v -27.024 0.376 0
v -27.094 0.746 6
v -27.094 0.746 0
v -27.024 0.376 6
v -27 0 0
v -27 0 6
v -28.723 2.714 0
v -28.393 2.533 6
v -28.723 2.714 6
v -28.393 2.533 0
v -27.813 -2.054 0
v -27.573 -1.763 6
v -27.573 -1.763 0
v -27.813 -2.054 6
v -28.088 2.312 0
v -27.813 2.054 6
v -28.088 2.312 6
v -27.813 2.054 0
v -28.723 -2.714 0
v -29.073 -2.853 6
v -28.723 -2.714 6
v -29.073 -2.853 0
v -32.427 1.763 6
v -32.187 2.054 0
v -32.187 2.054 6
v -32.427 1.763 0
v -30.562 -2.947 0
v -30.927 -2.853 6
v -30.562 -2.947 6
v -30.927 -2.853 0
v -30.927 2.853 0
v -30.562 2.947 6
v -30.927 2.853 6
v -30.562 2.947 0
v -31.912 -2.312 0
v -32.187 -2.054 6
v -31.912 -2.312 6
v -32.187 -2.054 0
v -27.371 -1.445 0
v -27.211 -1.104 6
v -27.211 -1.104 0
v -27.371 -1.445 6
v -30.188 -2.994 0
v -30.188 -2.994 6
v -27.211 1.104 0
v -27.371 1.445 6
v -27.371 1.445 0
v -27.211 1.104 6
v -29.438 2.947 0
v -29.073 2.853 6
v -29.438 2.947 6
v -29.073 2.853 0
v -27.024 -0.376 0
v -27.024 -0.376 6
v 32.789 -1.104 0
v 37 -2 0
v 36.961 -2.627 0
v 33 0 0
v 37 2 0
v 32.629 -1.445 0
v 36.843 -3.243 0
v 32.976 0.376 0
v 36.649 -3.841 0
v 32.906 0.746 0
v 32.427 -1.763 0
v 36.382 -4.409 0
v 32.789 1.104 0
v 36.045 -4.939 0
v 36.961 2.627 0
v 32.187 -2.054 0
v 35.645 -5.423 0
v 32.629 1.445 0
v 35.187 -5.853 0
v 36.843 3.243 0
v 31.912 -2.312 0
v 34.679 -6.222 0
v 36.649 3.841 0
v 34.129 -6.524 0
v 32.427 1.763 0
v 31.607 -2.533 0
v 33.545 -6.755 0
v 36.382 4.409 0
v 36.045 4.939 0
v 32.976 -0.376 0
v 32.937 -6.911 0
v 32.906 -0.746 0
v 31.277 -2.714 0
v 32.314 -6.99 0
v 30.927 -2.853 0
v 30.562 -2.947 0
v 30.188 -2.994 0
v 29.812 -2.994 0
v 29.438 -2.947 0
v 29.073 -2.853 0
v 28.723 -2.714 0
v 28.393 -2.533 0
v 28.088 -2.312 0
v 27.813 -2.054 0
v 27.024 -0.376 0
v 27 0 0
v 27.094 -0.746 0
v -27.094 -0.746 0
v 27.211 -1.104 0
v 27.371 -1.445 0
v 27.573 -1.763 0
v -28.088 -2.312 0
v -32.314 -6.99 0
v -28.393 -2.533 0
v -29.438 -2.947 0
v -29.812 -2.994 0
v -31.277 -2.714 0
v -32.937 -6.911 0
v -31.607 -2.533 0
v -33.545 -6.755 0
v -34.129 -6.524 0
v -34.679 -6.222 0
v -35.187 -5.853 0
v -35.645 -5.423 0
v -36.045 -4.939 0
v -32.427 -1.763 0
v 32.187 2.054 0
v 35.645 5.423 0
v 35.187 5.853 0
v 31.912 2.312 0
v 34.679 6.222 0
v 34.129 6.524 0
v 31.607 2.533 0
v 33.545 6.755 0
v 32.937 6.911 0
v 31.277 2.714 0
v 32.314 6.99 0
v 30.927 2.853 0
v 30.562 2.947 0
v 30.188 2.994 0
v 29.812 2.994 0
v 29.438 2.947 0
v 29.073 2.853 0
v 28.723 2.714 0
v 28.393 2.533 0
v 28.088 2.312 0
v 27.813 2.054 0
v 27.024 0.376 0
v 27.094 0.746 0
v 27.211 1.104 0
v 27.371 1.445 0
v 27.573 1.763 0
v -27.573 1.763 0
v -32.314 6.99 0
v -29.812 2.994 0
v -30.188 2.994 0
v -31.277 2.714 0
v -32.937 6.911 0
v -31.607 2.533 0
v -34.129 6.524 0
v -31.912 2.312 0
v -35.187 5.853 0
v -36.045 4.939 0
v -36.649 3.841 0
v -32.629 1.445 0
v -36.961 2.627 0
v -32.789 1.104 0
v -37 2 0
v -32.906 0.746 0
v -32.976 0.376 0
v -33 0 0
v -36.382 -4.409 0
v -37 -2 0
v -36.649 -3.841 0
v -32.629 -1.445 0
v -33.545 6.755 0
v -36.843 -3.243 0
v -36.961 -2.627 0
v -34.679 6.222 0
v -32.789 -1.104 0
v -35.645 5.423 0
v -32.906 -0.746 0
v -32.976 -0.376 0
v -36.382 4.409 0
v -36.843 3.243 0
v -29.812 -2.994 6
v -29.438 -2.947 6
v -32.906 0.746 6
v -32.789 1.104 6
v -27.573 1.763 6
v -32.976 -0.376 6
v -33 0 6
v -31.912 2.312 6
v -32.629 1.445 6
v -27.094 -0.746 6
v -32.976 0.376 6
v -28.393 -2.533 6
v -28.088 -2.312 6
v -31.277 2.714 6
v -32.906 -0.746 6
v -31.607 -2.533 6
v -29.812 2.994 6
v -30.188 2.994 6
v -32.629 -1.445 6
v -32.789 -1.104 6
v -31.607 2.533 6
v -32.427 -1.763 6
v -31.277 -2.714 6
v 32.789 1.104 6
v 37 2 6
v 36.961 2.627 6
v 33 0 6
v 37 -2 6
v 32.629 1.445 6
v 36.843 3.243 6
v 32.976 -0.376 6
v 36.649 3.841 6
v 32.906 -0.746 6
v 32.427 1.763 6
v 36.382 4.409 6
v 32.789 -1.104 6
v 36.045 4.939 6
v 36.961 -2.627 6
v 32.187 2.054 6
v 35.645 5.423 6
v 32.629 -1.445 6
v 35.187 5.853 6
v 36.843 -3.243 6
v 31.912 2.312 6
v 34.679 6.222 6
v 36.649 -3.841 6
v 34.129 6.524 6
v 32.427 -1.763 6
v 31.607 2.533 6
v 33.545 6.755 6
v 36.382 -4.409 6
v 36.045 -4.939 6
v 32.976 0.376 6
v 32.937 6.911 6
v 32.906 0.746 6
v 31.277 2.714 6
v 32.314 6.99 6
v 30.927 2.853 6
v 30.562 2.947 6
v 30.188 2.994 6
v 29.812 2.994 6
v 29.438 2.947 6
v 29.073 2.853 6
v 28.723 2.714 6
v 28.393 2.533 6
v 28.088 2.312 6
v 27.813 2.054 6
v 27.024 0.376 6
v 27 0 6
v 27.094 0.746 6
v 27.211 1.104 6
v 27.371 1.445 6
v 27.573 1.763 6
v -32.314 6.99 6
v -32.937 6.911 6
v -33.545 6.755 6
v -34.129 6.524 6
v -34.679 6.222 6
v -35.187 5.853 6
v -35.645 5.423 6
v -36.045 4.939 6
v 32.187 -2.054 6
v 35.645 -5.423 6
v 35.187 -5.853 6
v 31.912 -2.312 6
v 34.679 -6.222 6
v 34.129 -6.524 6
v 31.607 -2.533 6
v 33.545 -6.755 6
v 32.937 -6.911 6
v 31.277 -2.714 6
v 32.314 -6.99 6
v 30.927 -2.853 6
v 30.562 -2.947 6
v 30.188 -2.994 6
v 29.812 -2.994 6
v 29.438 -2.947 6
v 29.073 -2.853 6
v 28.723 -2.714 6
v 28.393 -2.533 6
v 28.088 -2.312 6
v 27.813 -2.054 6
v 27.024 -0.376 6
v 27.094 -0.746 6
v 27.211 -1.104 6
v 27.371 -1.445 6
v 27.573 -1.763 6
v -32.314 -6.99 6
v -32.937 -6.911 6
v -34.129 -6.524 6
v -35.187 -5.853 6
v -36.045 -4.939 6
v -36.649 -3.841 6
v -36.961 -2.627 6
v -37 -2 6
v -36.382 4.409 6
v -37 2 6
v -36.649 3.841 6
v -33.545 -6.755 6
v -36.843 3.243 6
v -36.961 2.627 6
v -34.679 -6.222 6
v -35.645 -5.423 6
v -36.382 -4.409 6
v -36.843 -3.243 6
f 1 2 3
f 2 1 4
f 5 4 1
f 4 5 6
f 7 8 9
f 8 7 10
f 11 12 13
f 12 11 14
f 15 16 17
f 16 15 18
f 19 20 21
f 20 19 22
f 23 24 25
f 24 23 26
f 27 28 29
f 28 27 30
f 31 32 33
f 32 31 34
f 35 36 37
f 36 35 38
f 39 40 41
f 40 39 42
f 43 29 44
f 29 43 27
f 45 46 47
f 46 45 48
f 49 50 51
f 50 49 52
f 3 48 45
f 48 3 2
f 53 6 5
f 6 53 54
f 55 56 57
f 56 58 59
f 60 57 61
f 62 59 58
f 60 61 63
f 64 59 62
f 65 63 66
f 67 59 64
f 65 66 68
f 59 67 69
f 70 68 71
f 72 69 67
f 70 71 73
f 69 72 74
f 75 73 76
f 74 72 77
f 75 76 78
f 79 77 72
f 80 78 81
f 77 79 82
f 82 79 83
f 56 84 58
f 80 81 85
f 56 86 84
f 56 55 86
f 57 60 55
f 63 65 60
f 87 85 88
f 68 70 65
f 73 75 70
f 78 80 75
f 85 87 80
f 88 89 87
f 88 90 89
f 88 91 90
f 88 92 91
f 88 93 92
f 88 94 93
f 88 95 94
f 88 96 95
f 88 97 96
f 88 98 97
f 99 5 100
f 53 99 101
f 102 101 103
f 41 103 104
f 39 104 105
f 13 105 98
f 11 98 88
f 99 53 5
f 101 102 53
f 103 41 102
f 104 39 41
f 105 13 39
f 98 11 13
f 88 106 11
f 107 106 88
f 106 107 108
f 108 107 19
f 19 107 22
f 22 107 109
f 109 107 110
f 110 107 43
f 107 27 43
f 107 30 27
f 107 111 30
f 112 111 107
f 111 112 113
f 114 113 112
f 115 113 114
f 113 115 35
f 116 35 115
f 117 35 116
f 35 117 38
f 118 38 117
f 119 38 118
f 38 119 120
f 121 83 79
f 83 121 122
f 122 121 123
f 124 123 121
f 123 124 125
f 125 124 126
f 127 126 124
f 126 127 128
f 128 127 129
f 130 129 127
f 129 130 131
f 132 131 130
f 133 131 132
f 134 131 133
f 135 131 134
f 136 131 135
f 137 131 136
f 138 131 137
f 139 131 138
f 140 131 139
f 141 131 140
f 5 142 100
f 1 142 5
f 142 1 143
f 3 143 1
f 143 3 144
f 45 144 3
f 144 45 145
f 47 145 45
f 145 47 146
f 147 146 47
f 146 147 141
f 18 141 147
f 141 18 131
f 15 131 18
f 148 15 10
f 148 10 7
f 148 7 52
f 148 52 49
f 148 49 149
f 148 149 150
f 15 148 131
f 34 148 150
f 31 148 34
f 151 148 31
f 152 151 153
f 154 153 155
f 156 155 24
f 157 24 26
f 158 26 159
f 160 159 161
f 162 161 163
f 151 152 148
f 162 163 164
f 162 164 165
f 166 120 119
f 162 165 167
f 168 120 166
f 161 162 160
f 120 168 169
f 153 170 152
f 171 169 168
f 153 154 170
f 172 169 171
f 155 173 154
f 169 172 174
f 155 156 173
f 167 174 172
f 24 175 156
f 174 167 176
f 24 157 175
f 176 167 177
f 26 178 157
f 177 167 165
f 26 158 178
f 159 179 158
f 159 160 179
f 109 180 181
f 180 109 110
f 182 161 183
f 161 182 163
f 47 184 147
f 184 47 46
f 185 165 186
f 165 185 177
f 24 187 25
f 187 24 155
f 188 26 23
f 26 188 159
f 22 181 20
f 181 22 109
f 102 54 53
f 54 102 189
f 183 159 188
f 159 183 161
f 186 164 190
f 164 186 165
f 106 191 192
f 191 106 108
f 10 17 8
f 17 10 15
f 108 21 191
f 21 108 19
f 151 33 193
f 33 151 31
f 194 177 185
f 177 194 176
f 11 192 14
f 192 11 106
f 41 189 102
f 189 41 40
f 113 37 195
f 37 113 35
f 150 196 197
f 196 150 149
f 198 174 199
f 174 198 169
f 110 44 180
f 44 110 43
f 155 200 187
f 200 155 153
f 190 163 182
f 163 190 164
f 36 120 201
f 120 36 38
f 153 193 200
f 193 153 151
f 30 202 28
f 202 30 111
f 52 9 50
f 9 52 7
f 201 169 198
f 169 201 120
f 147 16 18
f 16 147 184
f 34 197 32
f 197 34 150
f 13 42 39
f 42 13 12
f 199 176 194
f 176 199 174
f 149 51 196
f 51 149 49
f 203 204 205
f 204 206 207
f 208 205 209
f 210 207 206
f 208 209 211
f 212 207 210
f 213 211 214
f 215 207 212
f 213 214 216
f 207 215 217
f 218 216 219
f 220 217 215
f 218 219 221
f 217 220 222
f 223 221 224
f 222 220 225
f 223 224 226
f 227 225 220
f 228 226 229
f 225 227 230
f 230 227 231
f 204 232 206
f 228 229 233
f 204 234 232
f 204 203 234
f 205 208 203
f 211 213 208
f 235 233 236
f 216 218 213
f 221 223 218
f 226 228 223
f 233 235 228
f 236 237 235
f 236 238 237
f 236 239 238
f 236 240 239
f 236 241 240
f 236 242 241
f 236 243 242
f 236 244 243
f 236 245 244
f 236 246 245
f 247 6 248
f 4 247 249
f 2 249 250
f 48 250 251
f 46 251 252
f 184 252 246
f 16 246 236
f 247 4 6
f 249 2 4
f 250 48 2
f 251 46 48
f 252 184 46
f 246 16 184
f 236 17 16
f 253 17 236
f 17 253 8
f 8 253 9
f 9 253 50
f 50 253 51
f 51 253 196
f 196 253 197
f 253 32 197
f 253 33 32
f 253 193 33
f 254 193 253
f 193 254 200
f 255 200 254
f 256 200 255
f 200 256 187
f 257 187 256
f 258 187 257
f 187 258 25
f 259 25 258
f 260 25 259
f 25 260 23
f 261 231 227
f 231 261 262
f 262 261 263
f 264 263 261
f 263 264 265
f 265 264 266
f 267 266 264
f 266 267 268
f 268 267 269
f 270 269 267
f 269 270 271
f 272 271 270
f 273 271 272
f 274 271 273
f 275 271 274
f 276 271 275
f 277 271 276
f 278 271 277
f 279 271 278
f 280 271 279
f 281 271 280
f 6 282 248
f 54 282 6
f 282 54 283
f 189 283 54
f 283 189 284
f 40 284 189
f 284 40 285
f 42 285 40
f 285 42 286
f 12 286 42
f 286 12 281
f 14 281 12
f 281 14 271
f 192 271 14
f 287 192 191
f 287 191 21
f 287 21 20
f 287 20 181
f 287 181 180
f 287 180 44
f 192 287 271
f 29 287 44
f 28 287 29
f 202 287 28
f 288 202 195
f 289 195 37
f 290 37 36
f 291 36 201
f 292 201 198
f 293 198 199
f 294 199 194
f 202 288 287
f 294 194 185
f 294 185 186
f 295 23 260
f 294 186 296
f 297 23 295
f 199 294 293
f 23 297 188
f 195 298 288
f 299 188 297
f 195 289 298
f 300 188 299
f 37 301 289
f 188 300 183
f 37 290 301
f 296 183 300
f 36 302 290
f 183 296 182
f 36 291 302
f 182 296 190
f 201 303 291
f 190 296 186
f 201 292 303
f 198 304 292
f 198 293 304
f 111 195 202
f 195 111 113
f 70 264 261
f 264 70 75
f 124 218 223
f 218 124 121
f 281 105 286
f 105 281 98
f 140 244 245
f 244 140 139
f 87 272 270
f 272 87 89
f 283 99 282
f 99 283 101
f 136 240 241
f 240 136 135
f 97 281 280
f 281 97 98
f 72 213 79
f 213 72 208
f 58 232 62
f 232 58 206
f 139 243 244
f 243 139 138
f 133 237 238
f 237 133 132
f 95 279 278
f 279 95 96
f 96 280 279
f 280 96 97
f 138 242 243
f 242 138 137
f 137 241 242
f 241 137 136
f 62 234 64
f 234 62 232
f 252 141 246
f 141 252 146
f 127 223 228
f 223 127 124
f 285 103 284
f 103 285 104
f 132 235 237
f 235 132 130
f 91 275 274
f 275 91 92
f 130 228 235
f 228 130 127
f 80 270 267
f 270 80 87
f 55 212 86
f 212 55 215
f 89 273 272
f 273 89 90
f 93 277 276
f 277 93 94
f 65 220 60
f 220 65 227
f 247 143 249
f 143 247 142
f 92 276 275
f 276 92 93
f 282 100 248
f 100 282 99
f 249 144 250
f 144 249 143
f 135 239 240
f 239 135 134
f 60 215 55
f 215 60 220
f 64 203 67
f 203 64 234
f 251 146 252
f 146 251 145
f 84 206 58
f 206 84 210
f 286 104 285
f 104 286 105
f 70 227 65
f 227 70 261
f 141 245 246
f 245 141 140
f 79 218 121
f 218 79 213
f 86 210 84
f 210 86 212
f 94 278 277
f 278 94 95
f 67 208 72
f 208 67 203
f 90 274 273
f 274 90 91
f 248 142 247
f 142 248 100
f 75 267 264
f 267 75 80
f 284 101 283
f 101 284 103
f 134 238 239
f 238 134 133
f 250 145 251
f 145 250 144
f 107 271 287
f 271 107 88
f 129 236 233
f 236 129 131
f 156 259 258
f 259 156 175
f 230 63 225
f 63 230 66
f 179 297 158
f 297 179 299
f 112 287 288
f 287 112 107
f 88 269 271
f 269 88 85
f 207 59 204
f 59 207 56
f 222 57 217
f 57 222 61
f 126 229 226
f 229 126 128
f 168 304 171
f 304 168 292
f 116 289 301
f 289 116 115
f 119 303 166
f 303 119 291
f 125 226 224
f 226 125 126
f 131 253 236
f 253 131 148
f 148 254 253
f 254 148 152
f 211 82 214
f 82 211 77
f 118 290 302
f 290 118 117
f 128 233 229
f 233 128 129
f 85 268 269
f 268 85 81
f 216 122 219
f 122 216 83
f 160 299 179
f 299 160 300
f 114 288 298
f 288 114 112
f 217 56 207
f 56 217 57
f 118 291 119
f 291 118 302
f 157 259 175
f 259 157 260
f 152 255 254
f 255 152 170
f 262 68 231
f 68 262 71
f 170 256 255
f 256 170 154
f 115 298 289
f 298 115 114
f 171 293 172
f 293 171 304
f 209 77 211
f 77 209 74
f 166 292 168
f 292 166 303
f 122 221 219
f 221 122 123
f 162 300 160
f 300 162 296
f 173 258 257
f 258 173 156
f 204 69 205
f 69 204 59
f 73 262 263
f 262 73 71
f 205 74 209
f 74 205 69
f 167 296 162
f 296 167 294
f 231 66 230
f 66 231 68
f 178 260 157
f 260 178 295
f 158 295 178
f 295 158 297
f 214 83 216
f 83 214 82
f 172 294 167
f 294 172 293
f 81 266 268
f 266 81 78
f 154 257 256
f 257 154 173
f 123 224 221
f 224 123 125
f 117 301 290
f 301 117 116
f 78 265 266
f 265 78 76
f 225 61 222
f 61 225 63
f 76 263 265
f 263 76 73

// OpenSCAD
$fn = 50;


difference() {
	union() {
		hull() {
			translate(v = [-32.0000000000, 2.0000000000, 0]) {
				cylinder(h = 6, r = 5);
			}
			translate(v = [32.0000000000, 2.0000000000, 0]) {
				cylinder(h = 6, r = 5);
			}
			translate(v = [-32.0000000000, -2.0000000000, 0]) {
				cylinder(h = 6, r = 5);
			}
			translate(v = [32.0000000000, -2.0000000000, 0]) {
				cylinder(h = 6, r = 5);
			}
		}
	}
	union() {
		translate(v = [-30.0000000000, 0.0000000000, 0]) {
			cylinder(h = 6, r = 3.0000000000);
		}
		translate(v = [30.0000000000, 0.0000000000, 0]) {
			cylinder(h = 6, r = 3.0000000000);
		}
		translate(v = [-30.0000000000, 0.0000000000, 0]) {
			cylinder(h = 6, r = 1.5000000000);
		}
		translate(v = [30.0000000000, 0.0000000000, 0]) {
			cylinder(h = 6, r = 1.5000000000);
		}
		translate(v = [-30.0000000000, 0.0000000000, 0]) {
			cylinder(h = 6, r = 1.5000000000);
		}
		translate(v = [30.0000000000, 0.0000000000, 0]) {
			cylinder(h = 6, r = 1.5000000000);
		}
		translate(v = [-30.0000000000, 0.0000000000, 0]) {
			cylinder(h = 6, r = 1.5000000000);
		}
		translate(v = [30.0000000000, 0.0000000000, 0]) {
			cylinder(h = 6, r = 1.5000000000);
		}
	}
}
